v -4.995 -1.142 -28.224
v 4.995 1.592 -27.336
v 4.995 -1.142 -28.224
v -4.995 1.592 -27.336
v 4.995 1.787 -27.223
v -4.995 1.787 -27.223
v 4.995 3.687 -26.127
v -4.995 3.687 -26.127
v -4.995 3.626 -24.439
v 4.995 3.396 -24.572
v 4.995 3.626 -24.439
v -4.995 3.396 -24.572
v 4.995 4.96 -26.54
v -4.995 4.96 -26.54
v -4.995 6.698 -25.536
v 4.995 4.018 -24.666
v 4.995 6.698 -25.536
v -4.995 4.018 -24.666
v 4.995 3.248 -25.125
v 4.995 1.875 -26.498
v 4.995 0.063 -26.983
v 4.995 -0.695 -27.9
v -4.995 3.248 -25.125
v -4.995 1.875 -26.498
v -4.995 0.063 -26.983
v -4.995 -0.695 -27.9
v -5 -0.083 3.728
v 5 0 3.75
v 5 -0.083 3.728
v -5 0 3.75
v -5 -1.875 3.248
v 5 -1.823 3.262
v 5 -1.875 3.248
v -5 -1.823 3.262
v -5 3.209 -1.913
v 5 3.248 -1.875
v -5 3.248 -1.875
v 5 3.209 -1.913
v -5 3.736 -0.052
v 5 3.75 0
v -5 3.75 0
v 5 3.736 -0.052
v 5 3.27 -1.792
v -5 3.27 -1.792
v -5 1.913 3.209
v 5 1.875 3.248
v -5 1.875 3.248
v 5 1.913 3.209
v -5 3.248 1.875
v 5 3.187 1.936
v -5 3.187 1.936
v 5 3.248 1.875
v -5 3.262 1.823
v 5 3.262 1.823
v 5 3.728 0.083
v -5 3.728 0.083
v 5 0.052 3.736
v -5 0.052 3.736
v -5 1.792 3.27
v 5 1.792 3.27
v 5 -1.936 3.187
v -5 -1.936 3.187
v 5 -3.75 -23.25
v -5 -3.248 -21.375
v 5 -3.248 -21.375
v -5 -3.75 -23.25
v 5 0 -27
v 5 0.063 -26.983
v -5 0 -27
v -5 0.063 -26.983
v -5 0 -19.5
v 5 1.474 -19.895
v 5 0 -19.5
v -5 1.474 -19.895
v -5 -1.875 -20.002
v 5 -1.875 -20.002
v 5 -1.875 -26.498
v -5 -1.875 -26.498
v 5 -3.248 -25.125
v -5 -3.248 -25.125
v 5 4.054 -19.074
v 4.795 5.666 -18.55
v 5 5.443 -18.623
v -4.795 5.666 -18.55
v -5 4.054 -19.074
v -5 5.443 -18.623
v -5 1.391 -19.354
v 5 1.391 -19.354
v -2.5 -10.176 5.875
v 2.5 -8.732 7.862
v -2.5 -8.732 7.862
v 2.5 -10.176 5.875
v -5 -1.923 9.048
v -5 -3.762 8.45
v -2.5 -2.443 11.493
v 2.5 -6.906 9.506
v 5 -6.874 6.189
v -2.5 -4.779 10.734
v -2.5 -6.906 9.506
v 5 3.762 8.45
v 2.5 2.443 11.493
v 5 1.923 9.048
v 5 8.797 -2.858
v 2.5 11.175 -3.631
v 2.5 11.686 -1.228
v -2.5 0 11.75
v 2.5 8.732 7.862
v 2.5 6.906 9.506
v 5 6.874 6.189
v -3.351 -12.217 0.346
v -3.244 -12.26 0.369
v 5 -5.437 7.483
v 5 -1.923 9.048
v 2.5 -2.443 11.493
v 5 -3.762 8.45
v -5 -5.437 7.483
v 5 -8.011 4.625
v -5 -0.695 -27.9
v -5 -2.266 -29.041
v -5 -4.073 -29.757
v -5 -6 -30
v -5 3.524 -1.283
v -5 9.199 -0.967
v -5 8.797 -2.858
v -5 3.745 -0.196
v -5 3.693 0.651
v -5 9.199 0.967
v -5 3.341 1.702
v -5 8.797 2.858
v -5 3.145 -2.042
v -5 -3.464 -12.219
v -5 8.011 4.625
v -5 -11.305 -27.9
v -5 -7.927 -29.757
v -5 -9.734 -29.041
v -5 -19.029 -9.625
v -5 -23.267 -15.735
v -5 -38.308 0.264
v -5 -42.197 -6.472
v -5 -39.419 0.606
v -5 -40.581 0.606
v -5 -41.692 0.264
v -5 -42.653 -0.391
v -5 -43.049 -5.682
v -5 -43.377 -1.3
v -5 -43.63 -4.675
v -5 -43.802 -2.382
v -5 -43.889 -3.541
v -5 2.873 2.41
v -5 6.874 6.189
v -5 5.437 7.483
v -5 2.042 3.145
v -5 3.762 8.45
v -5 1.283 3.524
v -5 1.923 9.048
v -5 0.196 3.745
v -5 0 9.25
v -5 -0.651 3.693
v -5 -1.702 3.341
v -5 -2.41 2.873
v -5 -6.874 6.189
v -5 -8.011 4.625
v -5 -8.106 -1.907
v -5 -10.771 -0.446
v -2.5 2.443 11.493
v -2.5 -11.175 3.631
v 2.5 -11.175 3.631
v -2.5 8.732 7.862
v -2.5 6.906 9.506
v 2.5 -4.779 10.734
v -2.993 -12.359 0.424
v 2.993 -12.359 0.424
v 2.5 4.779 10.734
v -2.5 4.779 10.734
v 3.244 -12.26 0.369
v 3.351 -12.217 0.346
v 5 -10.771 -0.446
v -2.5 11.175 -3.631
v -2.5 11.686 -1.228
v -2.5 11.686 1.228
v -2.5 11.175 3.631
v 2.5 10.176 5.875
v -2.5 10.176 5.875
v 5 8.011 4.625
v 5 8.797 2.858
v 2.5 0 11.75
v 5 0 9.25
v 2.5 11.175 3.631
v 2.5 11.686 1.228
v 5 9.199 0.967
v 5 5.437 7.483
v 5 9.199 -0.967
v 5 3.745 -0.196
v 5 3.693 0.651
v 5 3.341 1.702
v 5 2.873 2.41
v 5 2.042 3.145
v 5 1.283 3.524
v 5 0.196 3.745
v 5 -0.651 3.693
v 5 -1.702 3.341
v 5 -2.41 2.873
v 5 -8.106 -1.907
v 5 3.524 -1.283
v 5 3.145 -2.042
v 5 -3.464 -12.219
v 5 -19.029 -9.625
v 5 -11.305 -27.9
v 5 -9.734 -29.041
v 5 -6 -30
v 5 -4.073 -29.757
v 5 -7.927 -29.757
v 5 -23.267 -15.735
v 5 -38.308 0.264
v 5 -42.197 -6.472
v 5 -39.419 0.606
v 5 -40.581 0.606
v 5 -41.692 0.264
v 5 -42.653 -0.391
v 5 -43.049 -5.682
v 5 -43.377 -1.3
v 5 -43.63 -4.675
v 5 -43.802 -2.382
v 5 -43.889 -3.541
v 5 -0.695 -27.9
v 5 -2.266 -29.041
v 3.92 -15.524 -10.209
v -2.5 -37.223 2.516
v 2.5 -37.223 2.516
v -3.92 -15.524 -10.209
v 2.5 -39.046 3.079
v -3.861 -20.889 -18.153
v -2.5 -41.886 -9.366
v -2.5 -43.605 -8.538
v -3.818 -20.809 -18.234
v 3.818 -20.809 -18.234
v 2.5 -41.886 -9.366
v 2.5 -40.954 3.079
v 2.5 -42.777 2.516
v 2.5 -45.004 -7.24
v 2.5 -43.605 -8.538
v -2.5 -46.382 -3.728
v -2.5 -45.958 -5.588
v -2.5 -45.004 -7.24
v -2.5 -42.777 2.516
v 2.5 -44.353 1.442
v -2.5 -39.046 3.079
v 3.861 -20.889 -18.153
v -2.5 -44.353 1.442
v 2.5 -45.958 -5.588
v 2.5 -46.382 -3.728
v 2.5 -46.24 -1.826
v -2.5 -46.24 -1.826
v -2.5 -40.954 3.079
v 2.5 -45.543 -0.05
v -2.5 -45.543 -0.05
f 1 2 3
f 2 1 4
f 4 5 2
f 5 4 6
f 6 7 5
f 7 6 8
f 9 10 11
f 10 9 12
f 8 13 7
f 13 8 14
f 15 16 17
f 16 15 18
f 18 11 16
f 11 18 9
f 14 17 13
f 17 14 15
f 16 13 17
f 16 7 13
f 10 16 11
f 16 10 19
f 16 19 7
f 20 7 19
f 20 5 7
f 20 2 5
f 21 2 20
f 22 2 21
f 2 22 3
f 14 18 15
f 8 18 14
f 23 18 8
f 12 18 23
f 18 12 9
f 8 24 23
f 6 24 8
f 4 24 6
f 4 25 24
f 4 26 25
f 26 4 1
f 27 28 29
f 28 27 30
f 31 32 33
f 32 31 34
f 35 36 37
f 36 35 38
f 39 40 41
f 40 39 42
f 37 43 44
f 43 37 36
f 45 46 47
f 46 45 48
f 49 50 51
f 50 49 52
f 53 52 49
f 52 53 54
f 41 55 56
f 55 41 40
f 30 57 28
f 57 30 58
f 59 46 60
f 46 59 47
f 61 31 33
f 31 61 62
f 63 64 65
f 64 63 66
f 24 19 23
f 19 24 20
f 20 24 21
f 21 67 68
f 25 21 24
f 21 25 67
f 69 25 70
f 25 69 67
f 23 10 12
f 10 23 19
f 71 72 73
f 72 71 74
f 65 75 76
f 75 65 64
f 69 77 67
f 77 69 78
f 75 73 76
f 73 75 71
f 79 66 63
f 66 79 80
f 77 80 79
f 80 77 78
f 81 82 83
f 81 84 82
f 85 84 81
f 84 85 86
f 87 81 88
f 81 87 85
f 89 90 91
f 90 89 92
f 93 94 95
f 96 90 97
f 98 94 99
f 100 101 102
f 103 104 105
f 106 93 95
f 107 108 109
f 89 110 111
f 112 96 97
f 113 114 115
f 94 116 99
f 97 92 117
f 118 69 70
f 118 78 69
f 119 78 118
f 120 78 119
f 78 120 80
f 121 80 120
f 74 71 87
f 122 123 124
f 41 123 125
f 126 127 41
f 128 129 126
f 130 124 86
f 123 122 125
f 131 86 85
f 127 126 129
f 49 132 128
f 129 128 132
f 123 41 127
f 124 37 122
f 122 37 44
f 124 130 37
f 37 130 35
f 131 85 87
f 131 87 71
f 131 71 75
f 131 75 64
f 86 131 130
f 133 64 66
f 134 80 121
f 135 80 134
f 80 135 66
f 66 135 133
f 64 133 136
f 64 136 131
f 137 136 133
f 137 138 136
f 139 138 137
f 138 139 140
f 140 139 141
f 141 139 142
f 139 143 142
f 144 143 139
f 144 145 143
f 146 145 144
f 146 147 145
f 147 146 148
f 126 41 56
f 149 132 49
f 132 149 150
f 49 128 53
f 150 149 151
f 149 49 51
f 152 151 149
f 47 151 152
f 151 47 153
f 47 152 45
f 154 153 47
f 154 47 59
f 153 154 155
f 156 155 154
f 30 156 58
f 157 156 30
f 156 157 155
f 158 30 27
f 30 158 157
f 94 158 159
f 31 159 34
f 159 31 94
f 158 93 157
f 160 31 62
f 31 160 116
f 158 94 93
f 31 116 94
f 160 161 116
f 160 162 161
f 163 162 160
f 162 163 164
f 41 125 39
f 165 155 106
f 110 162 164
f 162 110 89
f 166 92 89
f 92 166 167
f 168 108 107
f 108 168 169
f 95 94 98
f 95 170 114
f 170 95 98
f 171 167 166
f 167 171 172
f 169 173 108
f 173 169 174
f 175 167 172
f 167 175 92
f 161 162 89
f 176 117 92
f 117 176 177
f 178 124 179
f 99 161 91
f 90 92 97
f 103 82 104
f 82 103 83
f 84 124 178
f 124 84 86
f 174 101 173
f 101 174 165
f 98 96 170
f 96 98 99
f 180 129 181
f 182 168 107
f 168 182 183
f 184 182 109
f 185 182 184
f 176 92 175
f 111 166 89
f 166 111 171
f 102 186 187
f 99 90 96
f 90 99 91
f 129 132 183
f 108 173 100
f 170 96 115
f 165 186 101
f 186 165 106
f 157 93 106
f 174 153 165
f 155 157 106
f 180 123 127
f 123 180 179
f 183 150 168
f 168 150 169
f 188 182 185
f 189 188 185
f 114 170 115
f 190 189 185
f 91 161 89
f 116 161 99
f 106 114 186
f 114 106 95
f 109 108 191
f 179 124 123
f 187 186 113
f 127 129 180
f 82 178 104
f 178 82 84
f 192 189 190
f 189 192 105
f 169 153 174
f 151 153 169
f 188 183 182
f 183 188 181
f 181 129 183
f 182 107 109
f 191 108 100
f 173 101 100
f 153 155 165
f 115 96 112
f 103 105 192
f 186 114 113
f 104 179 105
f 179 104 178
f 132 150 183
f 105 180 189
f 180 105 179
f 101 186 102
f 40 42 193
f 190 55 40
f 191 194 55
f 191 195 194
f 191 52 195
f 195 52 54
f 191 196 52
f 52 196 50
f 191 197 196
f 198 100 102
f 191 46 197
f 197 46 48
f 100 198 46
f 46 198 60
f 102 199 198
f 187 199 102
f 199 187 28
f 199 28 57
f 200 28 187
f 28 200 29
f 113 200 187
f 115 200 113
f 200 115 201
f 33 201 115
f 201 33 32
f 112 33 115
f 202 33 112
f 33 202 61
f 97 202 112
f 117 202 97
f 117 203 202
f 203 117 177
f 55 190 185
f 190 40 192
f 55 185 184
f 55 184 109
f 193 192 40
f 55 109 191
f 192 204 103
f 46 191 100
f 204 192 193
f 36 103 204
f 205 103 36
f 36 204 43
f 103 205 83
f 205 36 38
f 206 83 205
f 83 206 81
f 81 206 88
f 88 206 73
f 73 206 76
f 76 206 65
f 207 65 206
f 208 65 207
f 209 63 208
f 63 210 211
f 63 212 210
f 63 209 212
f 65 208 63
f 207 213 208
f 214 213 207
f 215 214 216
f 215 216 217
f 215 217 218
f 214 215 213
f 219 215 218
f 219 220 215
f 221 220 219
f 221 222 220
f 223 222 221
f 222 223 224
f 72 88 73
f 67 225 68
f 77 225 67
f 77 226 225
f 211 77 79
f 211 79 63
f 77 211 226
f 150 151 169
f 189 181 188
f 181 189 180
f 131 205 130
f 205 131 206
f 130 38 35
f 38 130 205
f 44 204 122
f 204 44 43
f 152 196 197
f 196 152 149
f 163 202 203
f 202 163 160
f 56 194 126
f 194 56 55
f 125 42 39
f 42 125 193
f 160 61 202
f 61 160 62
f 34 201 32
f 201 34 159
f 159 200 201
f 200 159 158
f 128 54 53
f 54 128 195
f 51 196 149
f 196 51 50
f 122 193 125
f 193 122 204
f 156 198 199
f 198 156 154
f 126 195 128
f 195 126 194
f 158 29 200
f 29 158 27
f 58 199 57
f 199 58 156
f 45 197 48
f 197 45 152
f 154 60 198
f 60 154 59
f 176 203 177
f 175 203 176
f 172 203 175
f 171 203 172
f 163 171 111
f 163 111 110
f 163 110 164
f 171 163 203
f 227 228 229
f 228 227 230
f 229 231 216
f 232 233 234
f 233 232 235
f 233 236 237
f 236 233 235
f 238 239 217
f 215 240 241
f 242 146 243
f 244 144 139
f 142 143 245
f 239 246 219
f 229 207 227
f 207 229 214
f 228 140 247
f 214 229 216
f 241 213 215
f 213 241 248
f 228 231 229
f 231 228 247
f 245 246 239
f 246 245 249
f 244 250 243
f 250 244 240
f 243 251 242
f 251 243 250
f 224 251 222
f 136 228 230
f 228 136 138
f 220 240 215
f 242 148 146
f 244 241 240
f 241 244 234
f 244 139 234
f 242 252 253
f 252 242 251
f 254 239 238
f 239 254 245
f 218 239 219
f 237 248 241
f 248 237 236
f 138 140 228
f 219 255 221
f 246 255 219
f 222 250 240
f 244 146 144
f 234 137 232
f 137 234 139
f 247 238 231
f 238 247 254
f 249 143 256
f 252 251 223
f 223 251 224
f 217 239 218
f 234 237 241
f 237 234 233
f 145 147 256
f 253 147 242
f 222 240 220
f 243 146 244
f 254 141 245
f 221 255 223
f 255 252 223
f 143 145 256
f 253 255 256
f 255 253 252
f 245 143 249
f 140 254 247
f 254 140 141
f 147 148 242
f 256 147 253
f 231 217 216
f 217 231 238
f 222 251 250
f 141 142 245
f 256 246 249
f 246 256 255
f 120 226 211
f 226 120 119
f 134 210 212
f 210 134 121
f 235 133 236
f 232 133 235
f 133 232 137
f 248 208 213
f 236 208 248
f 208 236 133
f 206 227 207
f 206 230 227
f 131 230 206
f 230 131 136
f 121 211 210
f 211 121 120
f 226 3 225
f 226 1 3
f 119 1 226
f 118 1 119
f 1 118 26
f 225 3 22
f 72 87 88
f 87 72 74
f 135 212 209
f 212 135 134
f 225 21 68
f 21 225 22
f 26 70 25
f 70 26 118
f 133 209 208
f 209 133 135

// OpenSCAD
// upstairs closet shelves
rackD = 9;
rackSpacing = 49.5 - 8;

// ikea shop shelves:
rackD = 7.5;
rackSpacing = 30 - 6.75;


// sturdy
hookWidth = 10;
hookThick = 8;

// light weight:
/*hookWidth = 6;
hookThick = 6;*/

hookLength = 40;

bottomZ = -rackD*0.8;

module rackWire(inflate=0) {
    cylinder(d=rackD+inflate, h=100, center=true);
}
module rackWires() {
    rotate([0, 90, 0]) {
        rackWire();
        translate([rackSpacing, 0, 0]) rackWire();
    }
}

module beveledCyl(d, h, bevel) {
    hull() {
        translate([0,0,-h/2]) cylinder(r1=d/2-bevel, r2=d/2, h=bevel, center=false);
        translate([0,0,h/2 - bevel]) cylinder(r2=d/2-bevel, r1=d/2, h=bevel, center=false);
    }
}
module hookHull() {
rotate([0, 90, 0]) {
        d = rackD + 2 * hookThick;
        hull() {
            beveledCyl(d=d, h=hookWidth, bevel=2.5, center=true);
            translate([rackSpacing - hookThick + 1, bottomZ, 0]) cylinder(d=d, h=hookWidth, bevel=2.5, center=true);
        }
    }
}
module quarterCcl(d0, d1, h) {
    intersection() {
        rotate([0, 90, 0]) {
            difference() {
                cylinder(r=d0, h=h, center=true, $fn=60);
                cylinder(r=d0 - d1, h=h, center=true);

            }
        }
        translate([-h/2, 0, -d0 - d1 - hookThick]) cube(size=[h, d0 + d1 + hookThick, d0 + d1 + hookThick], center=false);
    }
}

module rotCcl(d) {
    rotate([0,90,0]) cylinder(d=d, h=hookWidth, center=true);
}
module clipCcl(thick) {
    difference() {
        rotCcl(d=rackSpacing*2 + rackD + thick*2);
        rotCcl(d=rackSpacing*2 + rackD);
    }
}

module clip2() {
    x = -rackD - 5;
    y = -rackSpacing;
    linear_extrude(height = hookWidth)
    polygon([
        [x, y],
        [x + 5, y - rackD - 3],
        [0, y - rackD - 3]
    ]);

}
module clip() {
    intersection() {
        union() {
            intersection() {
                intersection() {
                    translate([0,17,-5]) rotCcl(d=rackSpacing*2 + rackD + 2*3);
                    translate([0,-10,-1.3]) rotCcl(d=rackSpacing*2 + rackD + 2*1.5);
                }
                union () {
                    translate([0,17,-5]) clipCcl(3);

                    difference() {
                        translate([0,-10,-1.3]) clipCcl(1.5);
                        translate([0,15,0]) rotate([0,90,0]) cylinder(r=rackSpacing + rackD/2, h=hookWidth, center=true, $fn=60);
                    }
                }
                translate([0,-2,-rackSpacing-9]) rotate([0, 90, 0]) cylinder(r=11, h=hookWidth, center=true);
            }
            intersection() {
                translate([0,15,0]) clipCcl(1.5);
                translate([0,-10,-1.3]) clipCcl(2.5);
            }
        }
        translate([0,0,-50]) cube(size=[hookWidth-0.01, 100, 100], center=true);
    }
}

function knobCoords(dist) = [0, -hookLength * dist, -rackSpacing + hookLength*0.5*dist];

module knob() {
    color("blue") hull() {
        translate(knobCoords(1)) rotate([0, 90, 0]) {
            beveledCyl(d=2*(hookThick*0.8), h=hookWidth, bevel=2.5, center=true);
        }
        translate(knobCoords(0)) rotCcl(d=hookThick - 1);
    }
}

difference() {
    union() {
        clip();
        /*clip2();*/
        color("red") difference() {
            hookHull();
            /*#rotate([10,0,0]) rackWires();*/
            // cut out path for top shelf wire
            hull() {
                rotate([-50, 0, 0]) rackWires();
                rotate([-33, 0, 0]) rackWires();
            };
            // make sure there's room to get the wire under the hook
            if (rackSpacing < rackD * 4) {
                translate([0,-0.6 * (rackD + hookThick), 1.75 * (rackD + 2)]) hull() {
                    translate(knobCoords(0)) rotCcl(d=rackD + 2);
                    translate(knobCoords(1)) rotCcl(d=hookThick*1.6);
                }
            }
            quarterCcl(rackSpacing + rackD/2, rackD, 100);

        }
        knob();
        color("orange") hull() {
            translate(knobCoords(0.75)) rotCcl(d=1);
            translate([0,bottomZ,1]) translate(knobCoords(0)) rotCcl(d=rackD + hookThick);
            translate([0,0,10]) translate(knobCoords(0)) rotCcl(d=1);
        }
    }
    rackWires();
}
